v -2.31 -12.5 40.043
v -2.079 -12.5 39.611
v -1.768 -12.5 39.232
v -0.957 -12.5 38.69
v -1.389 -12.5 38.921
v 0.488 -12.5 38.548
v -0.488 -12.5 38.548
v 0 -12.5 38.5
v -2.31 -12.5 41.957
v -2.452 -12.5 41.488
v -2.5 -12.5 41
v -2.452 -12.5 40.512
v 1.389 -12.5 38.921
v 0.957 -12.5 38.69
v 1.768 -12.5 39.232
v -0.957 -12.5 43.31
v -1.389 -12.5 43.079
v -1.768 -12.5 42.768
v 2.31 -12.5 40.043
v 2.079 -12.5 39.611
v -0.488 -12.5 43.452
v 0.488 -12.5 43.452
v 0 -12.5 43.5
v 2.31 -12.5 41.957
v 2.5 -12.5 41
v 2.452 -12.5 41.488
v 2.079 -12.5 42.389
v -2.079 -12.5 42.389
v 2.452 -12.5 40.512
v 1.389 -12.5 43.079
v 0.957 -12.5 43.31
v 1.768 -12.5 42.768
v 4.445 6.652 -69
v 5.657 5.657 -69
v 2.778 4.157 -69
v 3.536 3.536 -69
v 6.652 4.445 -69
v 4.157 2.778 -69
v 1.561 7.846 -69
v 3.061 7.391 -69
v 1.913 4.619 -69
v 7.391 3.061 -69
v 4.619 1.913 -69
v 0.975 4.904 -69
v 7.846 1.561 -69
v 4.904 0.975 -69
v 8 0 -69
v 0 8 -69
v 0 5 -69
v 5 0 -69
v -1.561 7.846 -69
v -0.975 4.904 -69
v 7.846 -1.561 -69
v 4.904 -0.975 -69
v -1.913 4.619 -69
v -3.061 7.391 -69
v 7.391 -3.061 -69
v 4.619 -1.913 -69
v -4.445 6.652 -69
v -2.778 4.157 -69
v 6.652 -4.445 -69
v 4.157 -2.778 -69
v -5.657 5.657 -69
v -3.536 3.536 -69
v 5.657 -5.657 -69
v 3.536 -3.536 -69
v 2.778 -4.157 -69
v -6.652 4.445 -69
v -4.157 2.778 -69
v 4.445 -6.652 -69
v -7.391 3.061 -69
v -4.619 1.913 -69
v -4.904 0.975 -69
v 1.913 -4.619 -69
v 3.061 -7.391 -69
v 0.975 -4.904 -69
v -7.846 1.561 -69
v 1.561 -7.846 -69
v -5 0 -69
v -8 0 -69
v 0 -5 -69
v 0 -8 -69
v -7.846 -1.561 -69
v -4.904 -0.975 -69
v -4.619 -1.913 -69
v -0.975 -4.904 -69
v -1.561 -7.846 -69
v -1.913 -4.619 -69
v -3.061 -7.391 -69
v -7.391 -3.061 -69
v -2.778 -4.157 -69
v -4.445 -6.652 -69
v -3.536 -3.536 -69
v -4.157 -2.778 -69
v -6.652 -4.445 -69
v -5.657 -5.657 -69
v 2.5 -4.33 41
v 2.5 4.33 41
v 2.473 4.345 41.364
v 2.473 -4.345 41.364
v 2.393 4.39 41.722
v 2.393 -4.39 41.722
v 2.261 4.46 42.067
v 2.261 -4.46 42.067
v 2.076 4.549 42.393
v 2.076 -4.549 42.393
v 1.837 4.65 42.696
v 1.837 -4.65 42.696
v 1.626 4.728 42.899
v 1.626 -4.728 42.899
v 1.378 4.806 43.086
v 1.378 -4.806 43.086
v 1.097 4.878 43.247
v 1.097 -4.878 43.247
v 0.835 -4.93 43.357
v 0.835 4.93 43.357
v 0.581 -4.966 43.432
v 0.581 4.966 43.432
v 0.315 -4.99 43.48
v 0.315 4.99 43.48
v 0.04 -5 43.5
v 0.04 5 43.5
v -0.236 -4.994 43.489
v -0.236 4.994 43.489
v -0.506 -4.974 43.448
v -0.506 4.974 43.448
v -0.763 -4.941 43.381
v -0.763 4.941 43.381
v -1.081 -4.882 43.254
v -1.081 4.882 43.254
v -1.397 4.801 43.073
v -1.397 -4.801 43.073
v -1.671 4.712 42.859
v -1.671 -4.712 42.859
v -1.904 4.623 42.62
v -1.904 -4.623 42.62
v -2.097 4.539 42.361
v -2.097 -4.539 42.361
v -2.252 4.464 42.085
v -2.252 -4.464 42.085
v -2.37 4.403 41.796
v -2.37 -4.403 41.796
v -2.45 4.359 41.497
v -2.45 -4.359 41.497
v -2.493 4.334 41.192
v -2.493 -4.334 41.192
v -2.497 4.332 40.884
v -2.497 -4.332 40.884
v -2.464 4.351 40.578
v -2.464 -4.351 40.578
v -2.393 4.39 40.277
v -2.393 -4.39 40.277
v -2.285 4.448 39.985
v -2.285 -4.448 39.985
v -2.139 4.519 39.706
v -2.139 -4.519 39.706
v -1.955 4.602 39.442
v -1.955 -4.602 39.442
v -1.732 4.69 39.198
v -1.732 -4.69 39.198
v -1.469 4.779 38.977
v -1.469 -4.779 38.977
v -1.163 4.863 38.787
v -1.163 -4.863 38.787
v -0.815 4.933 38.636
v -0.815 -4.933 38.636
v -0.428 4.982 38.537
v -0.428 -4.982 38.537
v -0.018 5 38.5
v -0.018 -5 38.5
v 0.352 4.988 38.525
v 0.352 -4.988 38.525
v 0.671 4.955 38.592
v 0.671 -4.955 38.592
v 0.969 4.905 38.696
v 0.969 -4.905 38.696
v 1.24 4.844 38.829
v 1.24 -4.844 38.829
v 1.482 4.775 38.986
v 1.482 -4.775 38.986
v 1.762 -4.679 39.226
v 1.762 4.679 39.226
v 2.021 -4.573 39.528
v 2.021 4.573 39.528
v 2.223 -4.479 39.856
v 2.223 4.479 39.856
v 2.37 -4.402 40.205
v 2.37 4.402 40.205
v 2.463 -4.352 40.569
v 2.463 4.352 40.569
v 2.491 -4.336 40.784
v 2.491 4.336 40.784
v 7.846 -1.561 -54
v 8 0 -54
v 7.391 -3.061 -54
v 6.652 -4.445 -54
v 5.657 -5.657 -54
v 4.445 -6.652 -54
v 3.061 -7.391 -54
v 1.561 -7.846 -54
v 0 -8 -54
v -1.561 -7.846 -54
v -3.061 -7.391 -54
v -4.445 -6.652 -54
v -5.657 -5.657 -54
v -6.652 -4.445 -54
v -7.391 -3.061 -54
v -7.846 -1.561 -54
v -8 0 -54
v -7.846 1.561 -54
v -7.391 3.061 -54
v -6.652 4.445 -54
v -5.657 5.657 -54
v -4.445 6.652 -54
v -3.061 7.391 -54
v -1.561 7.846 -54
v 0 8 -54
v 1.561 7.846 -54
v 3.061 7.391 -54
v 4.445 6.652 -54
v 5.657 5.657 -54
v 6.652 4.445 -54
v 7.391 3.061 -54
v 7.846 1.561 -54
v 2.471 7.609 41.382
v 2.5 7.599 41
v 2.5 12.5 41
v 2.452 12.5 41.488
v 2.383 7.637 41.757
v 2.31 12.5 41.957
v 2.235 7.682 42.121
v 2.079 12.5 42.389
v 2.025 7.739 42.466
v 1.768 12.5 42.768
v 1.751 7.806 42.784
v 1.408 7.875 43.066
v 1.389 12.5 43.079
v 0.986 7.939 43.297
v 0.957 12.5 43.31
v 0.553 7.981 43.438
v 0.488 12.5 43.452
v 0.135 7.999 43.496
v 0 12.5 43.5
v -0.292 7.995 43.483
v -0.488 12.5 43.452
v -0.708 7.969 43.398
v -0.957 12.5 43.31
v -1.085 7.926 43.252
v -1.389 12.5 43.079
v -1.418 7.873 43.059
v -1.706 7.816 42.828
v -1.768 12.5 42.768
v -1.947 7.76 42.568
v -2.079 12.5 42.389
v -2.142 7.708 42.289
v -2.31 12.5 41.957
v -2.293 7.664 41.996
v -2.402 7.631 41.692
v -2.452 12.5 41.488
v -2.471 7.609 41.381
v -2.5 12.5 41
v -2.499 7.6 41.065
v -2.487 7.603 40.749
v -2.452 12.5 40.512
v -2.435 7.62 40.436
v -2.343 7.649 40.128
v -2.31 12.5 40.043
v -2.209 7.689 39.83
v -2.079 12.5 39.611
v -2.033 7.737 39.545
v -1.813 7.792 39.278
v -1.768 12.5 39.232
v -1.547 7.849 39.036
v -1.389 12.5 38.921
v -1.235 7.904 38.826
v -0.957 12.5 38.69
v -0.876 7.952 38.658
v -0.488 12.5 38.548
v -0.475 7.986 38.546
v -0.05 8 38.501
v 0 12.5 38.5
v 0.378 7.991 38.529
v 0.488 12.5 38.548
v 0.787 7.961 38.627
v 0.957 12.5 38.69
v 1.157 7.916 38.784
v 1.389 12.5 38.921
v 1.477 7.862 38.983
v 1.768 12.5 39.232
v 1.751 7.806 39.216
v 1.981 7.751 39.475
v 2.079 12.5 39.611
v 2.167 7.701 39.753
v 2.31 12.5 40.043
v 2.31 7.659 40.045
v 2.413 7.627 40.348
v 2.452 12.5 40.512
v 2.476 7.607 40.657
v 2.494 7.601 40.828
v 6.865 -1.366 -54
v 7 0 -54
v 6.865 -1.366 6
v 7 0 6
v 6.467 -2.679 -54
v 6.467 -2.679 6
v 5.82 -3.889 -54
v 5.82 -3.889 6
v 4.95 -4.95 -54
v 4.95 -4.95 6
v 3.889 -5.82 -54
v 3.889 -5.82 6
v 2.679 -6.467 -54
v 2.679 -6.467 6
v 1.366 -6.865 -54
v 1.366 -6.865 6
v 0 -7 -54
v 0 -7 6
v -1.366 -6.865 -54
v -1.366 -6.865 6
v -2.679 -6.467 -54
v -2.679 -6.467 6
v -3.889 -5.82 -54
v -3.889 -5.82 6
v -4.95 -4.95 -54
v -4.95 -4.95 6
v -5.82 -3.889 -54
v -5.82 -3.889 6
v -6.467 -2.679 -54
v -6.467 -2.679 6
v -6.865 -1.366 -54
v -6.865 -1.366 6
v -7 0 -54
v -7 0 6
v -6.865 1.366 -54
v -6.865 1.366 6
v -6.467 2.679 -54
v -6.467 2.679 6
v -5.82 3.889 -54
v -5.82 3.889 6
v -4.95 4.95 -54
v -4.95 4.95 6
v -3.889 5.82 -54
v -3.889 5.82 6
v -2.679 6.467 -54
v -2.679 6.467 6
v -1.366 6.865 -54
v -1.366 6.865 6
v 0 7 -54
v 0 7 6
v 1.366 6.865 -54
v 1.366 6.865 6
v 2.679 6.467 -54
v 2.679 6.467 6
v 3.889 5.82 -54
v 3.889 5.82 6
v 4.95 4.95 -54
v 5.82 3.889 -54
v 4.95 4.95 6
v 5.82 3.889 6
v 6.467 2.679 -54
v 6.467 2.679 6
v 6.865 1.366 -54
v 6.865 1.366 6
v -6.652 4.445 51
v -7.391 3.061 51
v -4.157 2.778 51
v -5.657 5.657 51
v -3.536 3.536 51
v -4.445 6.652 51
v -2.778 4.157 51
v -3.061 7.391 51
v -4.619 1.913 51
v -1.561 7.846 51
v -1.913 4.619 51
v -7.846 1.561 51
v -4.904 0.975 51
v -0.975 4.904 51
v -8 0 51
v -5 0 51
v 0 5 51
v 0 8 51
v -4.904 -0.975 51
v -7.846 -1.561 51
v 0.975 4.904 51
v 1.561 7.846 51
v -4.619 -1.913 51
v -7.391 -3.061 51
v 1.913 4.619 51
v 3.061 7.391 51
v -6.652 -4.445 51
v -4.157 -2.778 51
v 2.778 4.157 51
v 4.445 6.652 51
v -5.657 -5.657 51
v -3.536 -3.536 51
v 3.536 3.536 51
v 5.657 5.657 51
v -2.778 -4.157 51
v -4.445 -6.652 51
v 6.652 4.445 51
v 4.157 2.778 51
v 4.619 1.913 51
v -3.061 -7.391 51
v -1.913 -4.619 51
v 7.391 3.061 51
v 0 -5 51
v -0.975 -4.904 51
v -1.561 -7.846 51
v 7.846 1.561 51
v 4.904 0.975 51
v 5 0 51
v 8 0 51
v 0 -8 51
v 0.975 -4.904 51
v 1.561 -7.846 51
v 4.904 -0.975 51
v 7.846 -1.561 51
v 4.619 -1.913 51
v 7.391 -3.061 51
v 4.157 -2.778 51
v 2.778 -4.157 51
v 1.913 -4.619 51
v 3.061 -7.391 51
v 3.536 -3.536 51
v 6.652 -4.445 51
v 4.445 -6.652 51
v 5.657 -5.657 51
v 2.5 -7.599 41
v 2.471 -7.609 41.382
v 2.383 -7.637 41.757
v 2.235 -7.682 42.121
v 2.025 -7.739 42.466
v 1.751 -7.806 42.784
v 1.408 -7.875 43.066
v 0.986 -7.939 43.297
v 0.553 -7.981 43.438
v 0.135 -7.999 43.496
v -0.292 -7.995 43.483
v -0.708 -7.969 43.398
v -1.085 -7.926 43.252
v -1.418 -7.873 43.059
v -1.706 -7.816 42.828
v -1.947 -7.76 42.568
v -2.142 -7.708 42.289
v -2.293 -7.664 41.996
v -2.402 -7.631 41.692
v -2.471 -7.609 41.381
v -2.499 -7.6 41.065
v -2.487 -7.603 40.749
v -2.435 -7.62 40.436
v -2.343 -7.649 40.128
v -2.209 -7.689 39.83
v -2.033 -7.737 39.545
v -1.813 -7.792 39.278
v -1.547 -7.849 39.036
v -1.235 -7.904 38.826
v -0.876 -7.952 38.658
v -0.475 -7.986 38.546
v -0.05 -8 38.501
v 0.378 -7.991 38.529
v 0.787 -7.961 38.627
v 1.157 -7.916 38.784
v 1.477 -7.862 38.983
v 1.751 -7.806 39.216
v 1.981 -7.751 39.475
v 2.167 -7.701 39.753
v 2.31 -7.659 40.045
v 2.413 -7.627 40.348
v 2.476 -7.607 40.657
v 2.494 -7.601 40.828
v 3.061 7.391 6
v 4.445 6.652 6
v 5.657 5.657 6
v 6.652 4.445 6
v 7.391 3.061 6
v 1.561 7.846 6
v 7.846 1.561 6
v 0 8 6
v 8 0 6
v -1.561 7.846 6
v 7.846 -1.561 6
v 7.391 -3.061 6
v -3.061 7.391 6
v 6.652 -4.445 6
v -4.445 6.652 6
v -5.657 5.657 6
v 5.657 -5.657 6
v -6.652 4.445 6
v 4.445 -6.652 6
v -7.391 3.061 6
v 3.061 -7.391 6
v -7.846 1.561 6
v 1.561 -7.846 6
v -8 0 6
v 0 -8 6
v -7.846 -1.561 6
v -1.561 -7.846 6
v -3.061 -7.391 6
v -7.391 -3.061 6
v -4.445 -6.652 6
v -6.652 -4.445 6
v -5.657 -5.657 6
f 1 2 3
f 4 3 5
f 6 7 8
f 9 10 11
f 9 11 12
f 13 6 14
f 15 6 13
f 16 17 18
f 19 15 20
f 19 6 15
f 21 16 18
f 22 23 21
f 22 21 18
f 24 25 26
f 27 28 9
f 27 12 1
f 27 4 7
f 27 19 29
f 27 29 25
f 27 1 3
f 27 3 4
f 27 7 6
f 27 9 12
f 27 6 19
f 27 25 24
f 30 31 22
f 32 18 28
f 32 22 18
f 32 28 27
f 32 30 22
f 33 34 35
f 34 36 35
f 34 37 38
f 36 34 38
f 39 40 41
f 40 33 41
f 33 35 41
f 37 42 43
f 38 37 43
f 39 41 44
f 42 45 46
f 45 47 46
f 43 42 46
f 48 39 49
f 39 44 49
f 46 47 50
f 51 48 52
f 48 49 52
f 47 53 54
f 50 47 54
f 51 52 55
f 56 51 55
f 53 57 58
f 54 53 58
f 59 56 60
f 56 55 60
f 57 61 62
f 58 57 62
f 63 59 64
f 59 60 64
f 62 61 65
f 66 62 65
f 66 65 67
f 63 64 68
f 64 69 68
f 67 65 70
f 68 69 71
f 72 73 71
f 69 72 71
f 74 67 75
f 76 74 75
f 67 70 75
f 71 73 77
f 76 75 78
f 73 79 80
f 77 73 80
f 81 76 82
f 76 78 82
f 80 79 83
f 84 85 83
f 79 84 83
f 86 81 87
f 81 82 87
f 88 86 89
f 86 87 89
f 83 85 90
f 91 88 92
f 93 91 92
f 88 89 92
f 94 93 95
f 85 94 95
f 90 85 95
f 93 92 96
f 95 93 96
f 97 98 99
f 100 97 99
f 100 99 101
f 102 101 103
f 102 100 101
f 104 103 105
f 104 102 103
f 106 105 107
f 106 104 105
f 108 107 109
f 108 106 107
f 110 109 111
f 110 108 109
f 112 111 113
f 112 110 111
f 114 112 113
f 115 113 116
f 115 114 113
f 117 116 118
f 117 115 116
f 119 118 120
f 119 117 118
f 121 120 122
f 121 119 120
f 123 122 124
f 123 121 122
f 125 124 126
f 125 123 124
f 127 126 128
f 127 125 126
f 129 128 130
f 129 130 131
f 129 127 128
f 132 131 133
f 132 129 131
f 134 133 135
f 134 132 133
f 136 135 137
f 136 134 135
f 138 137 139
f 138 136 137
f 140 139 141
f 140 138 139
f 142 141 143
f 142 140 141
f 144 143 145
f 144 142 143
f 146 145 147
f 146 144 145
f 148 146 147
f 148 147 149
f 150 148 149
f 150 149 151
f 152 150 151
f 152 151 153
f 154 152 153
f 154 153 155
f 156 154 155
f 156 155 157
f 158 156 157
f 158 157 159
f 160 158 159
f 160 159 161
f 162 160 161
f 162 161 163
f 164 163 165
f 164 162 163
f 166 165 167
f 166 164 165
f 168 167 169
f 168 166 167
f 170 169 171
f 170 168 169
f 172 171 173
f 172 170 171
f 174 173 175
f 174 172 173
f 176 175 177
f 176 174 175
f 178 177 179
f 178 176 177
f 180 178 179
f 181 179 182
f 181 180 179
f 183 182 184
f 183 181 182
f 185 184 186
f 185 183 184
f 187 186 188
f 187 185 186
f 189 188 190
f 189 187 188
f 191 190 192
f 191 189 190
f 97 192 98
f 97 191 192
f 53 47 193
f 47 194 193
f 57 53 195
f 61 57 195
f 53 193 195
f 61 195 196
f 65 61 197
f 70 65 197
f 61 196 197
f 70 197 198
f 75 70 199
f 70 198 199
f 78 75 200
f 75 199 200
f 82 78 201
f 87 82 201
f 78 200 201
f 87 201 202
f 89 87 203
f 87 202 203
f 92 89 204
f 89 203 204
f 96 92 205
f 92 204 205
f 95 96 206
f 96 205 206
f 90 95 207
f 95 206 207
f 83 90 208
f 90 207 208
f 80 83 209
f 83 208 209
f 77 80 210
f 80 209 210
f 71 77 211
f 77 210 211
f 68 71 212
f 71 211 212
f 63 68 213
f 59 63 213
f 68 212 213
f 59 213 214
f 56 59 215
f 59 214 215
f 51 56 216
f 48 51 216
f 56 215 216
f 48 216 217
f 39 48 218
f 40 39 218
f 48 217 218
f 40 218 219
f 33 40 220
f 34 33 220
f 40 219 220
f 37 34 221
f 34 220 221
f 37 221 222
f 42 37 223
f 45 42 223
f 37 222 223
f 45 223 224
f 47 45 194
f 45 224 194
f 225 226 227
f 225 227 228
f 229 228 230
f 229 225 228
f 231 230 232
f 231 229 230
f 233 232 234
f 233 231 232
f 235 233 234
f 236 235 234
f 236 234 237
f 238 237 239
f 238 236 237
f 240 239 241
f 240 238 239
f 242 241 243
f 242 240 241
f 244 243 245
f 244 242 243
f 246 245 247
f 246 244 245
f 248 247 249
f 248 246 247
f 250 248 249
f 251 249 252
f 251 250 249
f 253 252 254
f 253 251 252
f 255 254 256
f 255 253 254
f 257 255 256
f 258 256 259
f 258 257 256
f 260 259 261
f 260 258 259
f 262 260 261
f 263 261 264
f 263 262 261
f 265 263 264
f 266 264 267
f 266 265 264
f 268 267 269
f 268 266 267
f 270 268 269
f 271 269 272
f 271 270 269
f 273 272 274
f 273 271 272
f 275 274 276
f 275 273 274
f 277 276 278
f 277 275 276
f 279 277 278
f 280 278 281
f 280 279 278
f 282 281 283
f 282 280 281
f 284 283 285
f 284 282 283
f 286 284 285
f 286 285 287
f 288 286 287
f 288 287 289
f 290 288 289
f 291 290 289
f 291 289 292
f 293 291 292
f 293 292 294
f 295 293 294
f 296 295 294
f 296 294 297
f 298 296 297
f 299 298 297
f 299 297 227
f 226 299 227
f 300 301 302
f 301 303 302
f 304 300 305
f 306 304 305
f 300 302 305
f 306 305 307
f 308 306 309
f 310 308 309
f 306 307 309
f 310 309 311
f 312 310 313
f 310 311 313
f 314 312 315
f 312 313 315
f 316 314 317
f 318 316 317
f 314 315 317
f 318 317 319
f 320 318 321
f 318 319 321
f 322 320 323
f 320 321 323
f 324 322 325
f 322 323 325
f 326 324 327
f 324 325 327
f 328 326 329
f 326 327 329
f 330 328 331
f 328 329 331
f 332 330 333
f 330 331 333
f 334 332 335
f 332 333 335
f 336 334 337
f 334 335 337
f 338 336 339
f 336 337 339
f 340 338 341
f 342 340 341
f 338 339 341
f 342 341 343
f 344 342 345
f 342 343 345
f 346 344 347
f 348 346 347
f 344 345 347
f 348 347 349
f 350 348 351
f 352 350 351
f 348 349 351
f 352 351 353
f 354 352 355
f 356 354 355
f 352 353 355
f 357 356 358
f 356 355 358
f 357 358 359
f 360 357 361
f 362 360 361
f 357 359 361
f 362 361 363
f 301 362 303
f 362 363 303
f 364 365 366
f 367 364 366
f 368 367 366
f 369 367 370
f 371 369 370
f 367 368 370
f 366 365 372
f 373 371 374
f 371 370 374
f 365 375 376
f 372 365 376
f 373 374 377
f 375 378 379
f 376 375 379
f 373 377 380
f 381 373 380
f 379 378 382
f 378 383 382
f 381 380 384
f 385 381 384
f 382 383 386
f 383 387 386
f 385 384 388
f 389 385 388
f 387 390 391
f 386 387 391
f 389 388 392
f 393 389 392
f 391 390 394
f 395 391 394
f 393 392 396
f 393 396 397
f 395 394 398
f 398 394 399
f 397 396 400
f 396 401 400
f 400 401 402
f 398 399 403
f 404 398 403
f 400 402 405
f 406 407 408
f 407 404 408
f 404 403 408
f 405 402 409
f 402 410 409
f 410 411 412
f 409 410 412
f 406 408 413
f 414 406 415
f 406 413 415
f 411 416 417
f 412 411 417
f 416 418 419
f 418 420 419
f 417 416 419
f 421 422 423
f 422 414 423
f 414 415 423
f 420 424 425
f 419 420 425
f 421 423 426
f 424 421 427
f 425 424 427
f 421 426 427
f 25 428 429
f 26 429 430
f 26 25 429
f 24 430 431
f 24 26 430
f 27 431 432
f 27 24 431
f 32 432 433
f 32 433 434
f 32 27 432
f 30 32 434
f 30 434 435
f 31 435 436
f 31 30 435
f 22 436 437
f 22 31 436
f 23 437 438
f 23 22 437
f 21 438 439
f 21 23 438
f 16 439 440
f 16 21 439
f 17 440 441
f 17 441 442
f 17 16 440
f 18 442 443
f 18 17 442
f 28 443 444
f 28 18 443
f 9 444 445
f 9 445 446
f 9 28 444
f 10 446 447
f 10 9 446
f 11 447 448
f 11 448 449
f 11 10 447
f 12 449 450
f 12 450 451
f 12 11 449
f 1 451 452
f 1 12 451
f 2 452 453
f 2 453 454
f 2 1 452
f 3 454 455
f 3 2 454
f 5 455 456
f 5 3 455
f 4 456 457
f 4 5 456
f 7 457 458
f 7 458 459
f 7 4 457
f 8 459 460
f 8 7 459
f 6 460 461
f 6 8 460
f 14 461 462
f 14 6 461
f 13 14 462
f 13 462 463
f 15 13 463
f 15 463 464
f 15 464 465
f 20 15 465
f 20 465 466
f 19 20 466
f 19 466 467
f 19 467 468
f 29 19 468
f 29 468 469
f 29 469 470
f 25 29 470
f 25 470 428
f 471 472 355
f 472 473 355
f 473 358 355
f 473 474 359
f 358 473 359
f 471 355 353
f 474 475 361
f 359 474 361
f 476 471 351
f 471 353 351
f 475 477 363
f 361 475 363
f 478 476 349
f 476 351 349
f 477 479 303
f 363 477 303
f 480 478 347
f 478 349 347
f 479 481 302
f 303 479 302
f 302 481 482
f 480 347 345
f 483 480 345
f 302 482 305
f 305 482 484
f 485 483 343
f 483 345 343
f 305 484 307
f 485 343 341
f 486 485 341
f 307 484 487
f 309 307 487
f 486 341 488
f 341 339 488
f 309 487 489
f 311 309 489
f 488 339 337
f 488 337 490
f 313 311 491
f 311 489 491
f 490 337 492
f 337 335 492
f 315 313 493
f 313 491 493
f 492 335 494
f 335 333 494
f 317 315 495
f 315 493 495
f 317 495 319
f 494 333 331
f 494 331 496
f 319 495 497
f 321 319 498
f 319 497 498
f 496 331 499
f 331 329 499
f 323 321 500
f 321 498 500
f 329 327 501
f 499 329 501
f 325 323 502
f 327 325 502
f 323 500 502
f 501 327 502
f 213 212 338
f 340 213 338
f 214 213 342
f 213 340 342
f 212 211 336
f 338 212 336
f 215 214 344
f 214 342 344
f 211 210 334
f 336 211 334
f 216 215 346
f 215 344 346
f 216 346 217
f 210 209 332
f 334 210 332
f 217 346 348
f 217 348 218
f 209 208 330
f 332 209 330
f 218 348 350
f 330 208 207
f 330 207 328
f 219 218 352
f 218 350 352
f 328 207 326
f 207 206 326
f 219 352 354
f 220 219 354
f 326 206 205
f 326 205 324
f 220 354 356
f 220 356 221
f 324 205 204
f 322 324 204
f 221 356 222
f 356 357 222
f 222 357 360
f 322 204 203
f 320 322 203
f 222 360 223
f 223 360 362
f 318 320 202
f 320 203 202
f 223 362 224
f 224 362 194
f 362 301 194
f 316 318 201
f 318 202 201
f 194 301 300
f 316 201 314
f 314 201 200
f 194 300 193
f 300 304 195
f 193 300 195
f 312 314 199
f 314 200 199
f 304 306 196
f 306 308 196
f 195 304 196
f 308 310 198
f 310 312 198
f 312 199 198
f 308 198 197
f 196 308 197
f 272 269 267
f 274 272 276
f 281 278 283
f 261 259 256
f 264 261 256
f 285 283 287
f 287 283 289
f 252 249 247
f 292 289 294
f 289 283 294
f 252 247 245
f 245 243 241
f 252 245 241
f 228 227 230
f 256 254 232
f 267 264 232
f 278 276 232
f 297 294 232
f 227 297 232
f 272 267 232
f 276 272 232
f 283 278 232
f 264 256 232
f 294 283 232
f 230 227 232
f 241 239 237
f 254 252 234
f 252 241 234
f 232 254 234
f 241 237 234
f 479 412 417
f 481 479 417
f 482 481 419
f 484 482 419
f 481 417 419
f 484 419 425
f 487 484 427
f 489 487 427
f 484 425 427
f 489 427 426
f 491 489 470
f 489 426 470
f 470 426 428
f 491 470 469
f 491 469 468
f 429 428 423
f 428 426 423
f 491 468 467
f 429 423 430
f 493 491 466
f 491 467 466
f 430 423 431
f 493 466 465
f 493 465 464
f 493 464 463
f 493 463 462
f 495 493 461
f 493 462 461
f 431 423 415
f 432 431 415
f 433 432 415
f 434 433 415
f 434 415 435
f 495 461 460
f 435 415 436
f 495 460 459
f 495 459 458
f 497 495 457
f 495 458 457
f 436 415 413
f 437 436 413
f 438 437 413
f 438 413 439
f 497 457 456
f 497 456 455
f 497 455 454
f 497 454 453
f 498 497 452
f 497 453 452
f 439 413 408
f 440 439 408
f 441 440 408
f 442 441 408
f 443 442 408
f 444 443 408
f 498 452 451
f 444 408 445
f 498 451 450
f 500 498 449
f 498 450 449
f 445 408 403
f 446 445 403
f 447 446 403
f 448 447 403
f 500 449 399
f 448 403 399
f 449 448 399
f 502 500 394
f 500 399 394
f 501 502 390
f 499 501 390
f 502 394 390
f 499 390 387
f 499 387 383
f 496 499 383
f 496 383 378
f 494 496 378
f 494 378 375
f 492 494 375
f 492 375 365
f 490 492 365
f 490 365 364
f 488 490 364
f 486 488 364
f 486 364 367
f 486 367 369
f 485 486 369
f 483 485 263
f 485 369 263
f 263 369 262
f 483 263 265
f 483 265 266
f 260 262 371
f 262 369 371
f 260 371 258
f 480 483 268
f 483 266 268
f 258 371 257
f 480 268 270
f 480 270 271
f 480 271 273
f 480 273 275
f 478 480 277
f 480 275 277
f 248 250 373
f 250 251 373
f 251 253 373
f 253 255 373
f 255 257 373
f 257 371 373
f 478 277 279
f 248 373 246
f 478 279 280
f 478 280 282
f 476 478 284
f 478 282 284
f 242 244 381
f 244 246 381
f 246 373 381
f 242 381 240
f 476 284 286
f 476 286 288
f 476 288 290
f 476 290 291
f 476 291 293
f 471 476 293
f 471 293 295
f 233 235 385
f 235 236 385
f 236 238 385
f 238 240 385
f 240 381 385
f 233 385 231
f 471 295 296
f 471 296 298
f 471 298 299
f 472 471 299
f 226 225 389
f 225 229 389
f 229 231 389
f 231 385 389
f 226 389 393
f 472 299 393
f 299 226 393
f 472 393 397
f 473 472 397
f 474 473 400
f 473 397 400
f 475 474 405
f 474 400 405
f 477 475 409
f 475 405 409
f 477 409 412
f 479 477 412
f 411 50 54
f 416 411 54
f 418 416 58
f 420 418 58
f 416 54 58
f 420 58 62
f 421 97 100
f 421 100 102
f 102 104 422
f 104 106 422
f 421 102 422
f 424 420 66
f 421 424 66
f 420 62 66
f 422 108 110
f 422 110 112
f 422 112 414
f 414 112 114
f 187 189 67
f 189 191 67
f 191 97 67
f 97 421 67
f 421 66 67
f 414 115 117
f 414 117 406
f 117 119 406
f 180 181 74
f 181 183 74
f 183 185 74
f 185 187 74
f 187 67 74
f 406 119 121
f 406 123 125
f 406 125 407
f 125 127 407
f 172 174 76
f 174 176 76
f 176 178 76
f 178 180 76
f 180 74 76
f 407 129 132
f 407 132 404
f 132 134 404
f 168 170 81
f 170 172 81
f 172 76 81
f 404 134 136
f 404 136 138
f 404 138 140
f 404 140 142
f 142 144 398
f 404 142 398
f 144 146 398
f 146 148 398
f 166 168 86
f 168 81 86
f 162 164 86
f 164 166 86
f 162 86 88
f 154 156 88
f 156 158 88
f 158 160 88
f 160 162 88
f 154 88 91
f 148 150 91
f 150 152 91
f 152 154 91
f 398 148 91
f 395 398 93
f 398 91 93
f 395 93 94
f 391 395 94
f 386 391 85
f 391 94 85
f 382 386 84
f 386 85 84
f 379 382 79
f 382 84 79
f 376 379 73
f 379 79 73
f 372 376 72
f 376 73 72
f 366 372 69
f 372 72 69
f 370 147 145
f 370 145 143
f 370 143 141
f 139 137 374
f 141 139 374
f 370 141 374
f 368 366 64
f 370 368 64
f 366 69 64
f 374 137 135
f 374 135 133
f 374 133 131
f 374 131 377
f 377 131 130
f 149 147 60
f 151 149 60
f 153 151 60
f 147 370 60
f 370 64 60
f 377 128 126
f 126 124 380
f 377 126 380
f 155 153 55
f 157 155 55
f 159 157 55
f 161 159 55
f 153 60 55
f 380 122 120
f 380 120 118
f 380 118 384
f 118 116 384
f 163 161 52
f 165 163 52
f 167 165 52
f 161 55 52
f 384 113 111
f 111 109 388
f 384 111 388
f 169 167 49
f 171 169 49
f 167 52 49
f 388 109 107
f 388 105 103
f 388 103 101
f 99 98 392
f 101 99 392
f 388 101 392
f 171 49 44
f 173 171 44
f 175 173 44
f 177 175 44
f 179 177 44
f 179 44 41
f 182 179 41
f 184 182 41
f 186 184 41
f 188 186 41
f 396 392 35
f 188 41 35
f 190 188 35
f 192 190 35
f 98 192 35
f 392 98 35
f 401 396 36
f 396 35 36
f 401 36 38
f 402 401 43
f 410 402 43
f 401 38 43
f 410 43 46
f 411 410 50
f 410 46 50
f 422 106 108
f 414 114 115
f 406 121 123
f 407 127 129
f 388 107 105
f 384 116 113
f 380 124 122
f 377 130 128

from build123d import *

# Parameters (mm, degrees)
F2_R     = 2.5
F3_DEPTH = 12.5


with BuildPart() as f1:
    # F0 (on Front) → F1 (revolve)
    with BuildSketch(Plane.XZ):
        Polygon((8, 51), (5, 51), (5, -69), (8, -69), (8, -54), (7, -54), (7, 6), (8, 6), align=None)
    revolve(axis=Axis((0, 0, -22.5128643215), (0, 0, -1)))

    # F2 (on Front) → F3 (join, symmetric)
    with BuildSketch(Plane.XZ):
        with Locations((0, 41)):
            Circle(F2_R)
    extrude(amount=F3_DEPTH, both=True)


solid = f1.part
